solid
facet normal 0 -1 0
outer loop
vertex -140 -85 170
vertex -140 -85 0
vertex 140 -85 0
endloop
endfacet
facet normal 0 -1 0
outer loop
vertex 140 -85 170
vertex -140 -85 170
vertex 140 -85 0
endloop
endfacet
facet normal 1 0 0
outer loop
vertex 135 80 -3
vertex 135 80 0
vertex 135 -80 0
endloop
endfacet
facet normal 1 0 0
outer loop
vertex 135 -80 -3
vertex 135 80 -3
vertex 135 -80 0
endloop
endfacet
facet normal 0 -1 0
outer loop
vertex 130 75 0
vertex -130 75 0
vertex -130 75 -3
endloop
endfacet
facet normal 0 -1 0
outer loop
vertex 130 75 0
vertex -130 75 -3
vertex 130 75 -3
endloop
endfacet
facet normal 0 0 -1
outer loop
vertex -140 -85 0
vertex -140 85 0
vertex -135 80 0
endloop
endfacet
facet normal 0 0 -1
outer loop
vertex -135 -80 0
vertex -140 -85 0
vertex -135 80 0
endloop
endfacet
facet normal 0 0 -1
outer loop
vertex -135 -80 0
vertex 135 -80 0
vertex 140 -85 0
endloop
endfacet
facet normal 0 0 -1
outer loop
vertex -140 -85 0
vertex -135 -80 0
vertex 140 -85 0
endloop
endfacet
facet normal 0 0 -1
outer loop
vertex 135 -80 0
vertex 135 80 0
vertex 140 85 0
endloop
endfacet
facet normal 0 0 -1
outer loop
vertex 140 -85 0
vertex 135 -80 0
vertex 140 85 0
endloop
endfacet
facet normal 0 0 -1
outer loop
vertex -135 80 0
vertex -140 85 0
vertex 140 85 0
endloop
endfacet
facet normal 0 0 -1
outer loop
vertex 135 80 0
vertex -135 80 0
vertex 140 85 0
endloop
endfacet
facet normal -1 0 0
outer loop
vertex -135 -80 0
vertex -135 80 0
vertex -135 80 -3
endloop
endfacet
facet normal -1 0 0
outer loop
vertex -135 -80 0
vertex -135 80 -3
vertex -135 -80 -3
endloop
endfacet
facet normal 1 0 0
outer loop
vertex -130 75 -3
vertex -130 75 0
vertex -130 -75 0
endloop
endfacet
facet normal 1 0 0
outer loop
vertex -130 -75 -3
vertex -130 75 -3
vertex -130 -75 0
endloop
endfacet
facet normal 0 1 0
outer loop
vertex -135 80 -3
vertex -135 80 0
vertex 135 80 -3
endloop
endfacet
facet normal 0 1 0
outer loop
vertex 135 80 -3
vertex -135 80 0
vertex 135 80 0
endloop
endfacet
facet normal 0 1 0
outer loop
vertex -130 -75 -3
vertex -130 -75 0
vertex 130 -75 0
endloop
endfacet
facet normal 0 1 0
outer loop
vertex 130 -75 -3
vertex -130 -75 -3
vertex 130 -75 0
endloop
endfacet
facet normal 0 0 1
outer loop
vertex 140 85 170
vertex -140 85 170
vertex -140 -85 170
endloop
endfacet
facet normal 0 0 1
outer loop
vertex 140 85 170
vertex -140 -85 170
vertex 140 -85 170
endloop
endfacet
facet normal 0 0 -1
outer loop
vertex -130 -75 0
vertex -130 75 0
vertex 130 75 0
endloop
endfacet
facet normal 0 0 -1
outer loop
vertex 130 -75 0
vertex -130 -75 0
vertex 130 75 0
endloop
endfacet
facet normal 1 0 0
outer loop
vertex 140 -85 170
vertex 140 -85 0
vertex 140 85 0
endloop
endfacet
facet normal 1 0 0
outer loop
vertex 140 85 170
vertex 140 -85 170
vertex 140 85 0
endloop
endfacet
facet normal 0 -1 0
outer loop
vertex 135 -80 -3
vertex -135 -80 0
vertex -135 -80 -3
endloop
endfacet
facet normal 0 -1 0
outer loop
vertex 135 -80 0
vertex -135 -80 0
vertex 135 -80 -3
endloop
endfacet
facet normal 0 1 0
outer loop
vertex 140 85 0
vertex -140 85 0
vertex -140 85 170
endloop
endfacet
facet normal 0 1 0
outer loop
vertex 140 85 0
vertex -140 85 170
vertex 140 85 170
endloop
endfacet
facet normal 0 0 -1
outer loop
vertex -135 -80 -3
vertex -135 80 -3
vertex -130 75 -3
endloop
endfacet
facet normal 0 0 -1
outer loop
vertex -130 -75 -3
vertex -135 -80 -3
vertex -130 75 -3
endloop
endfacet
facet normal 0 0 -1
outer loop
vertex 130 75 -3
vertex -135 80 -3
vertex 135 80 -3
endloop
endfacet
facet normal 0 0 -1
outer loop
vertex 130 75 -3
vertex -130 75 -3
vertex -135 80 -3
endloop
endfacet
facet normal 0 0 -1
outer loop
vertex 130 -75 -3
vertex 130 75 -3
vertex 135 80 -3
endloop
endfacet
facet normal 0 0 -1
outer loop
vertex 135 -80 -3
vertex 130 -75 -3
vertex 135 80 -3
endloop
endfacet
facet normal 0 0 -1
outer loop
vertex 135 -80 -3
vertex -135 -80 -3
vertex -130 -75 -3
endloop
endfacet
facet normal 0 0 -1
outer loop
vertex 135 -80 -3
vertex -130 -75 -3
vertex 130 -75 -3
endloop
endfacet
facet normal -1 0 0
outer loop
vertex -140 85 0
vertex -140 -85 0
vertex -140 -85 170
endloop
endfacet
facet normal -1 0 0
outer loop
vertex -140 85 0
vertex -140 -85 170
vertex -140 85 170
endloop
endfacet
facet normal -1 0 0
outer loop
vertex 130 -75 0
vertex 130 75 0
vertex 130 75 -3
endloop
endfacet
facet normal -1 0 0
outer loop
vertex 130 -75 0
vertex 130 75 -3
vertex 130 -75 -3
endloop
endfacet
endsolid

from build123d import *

# Parameters (mm, degrees)
F0_W     = 280
F0_H     = 170
F1_DEPTH = 170
F2_W     = 270
F2_H     = 160
F2_W_2   = 260
F2_H_2   = 150
F3_DEPTH = 3


with BuildPart() as f1:
    # F0 (on Top) → F1 (new body)
    with BuildSketch(Plane.XY):
        Rectangle(F0_W, F0_H)
    extrude(amount=F1_DEPTH)

    # F2 (on face) → F3 (join)
    with BuildSketch(Plane(origin=(0, 0, 0), x_dir=(1, 0, 0), z_dir=(0, 0, -1))):
        Rectangle(F2_W, F2_H)
        Rectangle(F2_W_2, F2_H_2, mode=Mode.SUBTRACT)
    extrude(amount=F3_DEPTH)


solid = f1.part
